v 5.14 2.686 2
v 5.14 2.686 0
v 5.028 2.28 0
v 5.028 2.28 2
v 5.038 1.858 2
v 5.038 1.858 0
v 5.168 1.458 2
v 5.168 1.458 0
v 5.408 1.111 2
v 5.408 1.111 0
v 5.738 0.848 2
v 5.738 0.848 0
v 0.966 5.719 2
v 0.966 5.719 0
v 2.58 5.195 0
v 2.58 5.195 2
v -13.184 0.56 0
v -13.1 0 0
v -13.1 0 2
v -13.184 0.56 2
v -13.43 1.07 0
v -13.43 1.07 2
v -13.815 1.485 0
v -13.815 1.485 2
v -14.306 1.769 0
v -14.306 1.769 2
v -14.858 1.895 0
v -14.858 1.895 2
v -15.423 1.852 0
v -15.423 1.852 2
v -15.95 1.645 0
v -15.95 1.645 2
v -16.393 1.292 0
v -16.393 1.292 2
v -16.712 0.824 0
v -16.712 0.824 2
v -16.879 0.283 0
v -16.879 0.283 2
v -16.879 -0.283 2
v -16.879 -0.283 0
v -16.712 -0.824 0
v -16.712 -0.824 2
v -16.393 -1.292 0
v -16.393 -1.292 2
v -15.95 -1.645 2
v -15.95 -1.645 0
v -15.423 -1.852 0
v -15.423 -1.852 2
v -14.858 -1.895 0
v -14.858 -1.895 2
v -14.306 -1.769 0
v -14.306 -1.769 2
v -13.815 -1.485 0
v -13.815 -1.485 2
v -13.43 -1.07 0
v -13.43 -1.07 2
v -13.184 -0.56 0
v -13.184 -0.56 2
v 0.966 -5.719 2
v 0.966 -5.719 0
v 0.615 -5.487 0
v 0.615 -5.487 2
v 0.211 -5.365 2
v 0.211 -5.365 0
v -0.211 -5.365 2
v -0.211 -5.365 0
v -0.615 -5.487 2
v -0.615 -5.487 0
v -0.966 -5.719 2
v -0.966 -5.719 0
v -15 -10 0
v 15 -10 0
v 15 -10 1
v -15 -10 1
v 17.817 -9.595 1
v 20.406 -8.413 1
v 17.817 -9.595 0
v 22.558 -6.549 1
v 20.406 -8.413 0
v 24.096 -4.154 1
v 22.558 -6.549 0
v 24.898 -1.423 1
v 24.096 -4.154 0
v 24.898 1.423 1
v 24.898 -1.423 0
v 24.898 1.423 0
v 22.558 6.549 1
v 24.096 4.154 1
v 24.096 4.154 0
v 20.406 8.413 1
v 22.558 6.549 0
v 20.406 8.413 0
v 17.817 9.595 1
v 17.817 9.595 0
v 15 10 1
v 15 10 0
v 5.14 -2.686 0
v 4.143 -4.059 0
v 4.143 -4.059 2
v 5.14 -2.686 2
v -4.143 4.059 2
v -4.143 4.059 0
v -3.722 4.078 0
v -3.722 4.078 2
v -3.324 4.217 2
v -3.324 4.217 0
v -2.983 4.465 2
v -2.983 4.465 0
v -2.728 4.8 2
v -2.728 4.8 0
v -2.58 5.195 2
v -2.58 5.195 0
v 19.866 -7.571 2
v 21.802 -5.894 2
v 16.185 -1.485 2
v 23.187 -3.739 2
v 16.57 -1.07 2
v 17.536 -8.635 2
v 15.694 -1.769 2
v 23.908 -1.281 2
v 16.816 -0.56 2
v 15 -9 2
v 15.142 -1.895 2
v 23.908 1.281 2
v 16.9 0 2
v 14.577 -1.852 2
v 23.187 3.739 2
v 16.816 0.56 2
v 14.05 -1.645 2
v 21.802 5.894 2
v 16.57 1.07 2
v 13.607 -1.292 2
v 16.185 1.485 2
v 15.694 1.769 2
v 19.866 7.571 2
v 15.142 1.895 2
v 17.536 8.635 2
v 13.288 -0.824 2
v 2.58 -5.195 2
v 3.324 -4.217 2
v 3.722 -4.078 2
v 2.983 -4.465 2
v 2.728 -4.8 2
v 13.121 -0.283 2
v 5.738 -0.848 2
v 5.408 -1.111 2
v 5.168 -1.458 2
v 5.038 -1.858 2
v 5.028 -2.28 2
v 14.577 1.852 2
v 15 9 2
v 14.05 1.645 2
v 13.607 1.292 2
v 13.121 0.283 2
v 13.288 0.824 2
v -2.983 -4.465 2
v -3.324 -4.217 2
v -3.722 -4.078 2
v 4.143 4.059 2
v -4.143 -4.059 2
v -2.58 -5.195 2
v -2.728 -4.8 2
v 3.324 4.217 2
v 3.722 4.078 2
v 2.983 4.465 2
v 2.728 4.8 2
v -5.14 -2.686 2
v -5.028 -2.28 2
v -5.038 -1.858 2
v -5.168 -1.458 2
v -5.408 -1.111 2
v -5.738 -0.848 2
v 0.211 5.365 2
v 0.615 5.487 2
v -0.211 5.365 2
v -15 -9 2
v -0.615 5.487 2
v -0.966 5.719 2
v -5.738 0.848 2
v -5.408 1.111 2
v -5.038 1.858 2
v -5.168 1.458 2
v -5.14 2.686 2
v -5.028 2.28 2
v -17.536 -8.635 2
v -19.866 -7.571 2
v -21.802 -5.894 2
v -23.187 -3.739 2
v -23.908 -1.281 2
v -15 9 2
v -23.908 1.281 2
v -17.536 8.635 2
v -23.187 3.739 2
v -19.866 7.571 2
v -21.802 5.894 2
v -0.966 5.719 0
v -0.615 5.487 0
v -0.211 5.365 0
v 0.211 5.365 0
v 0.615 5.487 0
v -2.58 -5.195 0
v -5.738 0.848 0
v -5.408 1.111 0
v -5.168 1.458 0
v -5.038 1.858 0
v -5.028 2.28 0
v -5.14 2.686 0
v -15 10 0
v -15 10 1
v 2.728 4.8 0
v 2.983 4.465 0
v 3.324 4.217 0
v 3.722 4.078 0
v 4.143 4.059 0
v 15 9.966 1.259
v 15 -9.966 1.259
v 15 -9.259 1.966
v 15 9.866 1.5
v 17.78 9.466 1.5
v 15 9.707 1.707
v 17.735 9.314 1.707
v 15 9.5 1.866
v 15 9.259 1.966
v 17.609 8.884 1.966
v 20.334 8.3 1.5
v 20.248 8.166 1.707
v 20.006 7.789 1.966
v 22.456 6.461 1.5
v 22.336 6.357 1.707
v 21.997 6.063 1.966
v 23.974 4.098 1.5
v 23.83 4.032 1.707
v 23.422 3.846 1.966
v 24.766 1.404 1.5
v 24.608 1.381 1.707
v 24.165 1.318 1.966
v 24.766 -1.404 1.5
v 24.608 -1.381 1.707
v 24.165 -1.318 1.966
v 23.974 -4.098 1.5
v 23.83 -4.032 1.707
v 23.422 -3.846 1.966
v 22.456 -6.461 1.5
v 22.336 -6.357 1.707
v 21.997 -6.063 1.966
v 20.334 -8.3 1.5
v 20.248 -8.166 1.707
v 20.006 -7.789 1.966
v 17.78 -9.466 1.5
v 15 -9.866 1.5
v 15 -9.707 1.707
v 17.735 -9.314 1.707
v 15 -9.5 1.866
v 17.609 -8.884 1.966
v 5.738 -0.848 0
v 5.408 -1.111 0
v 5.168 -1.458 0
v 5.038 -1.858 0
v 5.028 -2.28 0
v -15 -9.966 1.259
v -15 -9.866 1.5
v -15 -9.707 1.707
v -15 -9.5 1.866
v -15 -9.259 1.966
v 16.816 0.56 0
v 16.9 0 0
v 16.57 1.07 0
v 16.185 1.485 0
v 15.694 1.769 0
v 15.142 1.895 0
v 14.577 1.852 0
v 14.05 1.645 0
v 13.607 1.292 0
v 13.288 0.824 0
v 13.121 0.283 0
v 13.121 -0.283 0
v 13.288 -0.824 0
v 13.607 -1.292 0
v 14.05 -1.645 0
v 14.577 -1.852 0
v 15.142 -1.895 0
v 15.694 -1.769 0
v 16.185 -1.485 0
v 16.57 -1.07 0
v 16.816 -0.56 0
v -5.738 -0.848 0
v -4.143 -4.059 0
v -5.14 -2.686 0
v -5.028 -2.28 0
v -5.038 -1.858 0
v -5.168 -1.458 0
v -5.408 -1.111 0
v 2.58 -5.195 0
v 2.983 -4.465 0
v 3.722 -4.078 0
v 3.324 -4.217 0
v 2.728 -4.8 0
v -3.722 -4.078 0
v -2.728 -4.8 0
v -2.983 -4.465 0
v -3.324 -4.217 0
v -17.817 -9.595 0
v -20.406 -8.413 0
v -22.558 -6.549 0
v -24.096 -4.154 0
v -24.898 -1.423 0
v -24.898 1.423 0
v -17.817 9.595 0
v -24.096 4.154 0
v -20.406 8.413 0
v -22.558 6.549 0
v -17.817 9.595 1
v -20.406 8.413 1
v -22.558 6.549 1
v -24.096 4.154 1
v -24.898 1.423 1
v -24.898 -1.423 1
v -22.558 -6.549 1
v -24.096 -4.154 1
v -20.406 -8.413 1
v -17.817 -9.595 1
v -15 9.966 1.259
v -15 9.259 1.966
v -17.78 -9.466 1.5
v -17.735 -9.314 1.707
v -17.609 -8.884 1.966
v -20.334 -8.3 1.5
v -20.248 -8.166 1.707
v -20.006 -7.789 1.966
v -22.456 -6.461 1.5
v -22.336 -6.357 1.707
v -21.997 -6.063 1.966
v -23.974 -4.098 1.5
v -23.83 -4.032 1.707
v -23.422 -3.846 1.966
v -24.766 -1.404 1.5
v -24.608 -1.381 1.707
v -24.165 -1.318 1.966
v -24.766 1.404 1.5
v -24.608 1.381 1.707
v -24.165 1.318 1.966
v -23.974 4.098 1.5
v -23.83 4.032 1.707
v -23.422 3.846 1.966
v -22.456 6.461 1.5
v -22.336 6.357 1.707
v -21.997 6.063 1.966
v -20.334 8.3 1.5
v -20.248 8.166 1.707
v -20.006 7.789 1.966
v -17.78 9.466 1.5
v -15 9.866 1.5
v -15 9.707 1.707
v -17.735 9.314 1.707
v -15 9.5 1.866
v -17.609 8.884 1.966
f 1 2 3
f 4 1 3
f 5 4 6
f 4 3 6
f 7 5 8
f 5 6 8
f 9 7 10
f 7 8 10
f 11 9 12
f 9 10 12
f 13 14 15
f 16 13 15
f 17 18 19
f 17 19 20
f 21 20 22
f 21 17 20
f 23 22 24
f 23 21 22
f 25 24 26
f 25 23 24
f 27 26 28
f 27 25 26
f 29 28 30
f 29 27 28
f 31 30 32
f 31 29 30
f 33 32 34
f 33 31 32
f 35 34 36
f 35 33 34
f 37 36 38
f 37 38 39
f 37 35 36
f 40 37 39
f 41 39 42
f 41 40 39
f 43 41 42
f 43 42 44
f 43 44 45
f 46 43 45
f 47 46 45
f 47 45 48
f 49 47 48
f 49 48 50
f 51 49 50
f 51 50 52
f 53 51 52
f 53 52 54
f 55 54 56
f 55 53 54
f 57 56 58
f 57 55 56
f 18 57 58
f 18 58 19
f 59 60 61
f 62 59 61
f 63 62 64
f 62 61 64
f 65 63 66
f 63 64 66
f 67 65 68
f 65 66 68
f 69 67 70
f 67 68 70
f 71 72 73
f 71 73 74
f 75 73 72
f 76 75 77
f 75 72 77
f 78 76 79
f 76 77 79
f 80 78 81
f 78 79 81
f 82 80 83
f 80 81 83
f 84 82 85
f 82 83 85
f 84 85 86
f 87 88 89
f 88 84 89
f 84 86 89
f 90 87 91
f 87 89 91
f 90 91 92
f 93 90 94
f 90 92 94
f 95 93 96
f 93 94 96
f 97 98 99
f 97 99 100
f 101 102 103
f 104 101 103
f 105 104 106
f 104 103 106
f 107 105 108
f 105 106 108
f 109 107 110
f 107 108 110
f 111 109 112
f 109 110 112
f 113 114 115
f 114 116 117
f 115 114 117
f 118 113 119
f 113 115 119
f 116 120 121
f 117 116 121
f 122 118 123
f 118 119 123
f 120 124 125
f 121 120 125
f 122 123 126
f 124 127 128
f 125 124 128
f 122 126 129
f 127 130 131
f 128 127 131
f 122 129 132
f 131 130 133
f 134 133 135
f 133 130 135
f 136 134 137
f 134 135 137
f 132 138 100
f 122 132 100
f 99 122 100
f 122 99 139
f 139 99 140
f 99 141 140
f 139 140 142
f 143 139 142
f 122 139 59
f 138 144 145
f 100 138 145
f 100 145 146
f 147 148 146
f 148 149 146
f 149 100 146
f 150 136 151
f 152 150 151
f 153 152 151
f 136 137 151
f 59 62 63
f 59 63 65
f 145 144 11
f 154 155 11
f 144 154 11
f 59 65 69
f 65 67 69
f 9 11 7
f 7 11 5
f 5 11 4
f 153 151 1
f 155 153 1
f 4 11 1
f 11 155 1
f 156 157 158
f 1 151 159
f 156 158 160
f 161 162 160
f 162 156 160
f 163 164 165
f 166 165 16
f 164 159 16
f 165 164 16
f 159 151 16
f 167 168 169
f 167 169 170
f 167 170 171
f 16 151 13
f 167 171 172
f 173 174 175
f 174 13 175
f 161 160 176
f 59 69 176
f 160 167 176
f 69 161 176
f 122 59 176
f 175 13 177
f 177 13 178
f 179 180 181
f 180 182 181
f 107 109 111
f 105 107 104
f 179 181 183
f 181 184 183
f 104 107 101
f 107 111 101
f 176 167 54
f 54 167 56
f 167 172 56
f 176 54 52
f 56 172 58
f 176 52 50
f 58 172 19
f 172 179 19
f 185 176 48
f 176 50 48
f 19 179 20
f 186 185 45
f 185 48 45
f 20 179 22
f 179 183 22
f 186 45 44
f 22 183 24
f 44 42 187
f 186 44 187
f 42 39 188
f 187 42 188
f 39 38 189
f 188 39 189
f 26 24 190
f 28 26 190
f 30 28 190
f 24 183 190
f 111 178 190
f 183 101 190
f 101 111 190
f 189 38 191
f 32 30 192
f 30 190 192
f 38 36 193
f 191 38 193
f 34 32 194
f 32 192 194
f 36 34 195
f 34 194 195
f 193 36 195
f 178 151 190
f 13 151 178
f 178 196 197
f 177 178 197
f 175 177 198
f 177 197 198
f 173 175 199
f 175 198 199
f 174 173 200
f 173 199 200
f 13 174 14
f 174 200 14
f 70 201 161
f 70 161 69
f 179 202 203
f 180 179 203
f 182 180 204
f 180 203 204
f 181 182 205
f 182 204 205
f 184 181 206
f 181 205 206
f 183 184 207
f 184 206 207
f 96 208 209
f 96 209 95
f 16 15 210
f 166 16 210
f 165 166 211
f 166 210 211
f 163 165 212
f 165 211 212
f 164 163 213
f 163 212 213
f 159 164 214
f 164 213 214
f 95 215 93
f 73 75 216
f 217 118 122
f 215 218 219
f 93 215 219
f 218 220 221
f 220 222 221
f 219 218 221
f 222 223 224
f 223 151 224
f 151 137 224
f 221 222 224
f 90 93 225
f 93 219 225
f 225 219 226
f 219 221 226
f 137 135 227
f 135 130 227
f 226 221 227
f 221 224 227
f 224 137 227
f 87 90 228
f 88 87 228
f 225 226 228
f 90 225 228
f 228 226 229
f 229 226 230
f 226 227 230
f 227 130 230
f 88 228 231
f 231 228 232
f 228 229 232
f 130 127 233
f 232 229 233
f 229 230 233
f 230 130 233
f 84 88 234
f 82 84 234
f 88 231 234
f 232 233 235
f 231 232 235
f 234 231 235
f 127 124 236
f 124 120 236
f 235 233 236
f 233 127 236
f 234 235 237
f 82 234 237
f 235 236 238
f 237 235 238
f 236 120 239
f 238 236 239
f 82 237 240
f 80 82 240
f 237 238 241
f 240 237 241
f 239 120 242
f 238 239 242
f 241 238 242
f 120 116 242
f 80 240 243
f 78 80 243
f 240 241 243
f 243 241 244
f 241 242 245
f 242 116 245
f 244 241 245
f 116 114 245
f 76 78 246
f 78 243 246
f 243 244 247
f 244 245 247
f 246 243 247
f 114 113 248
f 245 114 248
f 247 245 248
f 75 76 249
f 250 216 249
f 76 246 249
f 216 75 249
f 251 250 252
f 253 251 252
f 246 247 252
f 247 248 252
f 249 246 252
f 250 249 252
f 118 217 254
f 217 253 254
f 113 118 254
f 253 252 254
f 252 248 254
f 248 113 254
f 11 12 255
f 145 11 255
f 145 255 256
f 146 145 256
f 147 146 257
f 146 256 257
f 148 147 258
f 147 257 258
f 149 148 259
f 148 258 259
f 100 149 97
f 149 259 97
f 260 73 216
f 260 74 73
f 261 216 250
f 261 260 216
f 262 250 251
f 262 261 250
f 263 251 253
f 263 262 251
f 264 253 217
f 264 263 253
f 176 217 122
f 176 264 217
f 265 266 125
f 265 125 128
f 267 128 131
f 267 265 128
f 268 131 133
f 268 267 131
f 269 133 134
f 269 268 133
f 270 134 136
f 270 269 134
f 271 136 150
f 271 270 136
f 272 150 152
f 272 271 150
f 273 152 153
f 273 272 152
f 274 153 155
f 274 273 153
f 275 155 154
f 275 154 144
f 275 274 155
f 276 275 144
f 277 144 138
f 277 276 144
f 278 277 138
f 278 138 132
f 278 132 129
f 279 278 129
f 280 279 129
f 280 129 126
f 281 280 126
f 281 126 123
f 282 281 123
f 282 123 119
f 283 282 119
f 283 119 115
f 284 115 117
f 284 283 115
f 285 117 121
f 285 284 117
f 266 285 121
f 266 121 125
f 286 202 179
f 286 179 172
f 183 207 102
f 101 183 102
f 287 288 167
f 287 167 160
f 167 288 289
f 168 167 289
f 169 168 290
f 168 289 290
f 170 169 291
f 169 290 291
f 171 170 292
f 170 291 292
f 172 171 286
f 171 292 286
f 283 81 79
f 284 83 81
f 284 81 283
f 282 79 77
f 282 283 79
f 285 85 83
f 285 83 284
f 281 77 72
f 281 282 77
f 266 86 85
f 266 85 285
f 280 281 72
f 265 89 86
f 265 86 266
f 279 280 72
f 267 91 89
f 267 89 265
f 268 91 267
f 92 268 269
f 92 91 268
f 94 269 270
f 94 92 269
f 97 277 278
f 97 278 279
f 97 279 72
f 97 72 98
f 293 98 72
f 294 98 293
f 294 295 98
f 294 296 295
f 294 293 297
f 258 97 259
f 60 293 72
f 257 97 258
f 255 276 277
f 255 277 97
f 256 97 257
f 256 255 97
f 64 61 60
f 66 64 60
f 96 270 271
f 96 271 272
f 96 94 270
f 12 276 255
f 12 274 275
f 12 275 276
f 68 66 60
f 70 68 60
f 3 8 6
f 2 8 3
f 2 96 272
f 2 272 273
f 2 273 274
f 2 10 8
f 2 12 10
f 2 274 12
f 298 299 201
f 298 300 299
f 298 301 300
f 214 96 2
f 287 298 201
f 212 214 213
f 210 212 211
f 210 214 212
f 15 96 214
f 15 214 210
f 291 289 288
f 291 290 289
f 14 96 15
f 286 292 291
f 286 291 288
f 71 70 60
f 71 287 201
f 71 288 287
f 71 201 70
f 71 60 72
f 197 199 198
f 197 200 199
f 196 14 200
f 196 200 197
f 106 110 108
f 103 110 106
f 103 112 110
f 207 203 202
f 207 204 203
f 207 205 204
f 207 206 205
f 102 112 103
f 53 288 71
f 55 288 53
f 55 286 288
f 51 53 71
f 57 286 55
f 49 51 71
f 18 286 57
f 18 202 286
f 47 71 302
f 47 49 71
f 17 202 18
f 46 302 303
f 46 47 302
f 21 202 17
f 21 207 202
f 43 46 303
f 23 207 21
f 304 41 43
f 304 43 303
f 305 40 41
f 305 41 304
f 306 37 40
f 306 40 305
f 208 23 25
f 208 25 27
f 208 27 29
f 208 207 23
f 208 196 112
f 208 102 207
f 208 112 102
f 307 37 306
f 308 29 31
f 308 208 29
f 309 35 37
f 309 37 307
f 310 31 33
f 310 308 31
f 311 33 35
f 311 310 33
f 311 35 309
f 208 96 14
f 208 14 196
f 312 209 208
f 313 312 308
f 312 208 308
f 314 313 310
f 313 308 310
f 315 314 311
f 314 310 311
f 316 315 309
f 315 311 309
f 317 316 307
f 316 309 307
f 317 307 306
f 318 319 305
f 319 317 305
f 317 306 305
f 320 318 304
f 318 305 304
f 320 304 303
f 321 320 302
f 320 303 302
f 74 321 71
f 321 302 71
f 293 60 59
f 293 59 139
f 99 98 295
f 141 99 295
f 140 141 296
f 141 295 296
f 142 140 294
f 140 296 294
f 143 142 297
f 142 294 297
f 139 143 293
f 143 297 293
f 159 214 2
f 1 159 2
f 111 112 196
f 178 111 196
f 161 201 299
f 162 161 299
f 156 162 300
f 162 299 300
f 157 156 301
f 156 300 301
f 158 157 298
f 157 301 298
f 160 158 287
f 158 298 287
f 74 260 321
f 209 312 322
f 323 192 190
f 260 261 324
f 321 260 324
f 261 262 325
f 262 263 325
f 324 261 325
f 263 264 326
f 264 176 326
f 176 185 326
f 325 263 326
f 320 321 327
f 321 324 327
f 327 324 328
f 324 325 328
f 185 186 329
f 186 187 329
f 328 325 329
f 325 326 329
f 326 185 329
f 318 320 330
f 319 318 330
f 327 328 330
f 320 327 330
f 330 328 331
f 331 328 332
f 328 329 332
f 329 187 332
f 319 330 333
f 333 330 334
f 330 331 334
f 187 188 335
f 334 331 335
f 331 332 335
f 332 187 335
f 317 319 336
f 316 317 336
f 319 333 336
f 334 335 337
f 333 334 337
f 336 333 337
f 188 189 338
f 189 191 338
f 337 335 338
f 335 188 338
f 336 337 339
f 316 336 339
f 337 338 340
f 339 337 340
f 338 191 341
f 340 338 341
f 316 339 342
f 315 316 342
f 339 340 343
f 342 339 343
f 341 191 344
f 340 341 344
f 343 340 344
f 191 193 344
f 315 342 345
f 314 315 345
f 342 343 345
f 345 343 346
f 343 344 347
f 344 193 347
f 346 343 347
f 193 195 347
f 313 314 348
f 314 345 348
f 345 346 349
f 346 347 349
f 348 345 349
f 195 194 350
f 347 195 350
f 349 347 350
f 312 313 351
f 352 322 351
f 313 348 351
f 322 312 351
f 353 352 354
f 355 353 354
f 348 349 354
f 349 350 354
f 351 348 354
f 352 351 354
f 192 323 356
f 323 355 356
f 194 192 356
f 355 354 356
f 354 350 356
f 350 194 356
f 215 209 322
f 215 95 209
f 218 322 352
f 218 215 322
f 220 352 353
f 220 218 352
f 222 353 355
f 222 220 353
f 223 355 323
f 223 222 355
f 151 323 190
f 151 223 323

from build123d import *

# Parameters (mm, degrees)
SKETCH_R  = 1.9
PAD_DEPTH = 2
FILLET_R  = 1


with BuildPart() as part:
    # Sketch → Pad (new body)
    with BuildSketch(Plane.XY):
        with BuildLine():
            Line((-15.000027, 10), (15.000027, 10))
            ThreePointArc((15.000027, -10), (25, 0), (15.000027, 10))
            Line((15.000027, -10), (-15.000027, -10))
            ThreePointArc((-15.000027, 10), (-25, 0), (-15.000027, -10))
        make_face()
        with Locations((-15, 0)):
            Circle(SKETCH_R, mode=Mode.SUBTRACT)
        with Locations((15, 0)):
            Circle(SKETCH_R, mode=Mode.SUBTRACT)
        with BuildLine():
            ThreePointArc((-0.966331, 5.718934), (0, 5.35), (0.966331, 5.718934))
            Line((0.966331, 5.718934), (2.579727, 5.19471))
            ThreePointArc((2.579727, 5.19471), (3.144651, 4.328241), (4.143283, 4.058719))
            Line((4.143283, 4.058719), (5.140417, 2.686283))
            ThreePointArc((5.140417, 2.686283), (5.088152, 1.653241), (5.737642, 0.848212))
            Line((5.737642, 0.848212), (5.737642, -0.848212))
            ThreePointArc((5.737642, -0.848212), (5.088152, -1.653241), (5.140417, -2.686283))
            Line((4.143283, -4.058719), (5.140417, -2.686283))
            ThreePointArc((4.143283, -4.058719), (3.144651, -4.328241), (2.579727, -5.19471))
            Line((0.966331, -5.718934), (2.579727, -5.19471))
            ThreePointArc((0.966331, -5.718934), (0, -5.35), (-0.966331, -5.718934))
            Line((-2.579727, -5.19471), (-0.966331, -5.718934))
            ThreePointArc((-2.579727, -5.19471), (-3.144651, -4.328241), (-4.143283, -4.058719))
            Line((-5.140417, -2.686283), (-4.143283, -4.058719))
            ThreePointArc((-5.140417, -2.686283), (-5.088152, -1.653241), (-5.737642, -0.848212))
            Line((-5.737642, 0.848212), (-5.737642, -0.848212))
            ThreePointArc((-5.737642, 0.848212), (-5.088152, 1.653241), (-5.140417, 2.686283))
            Line((-5.140417, 2.686283), (-4.143283, 4.058719))
            ThreePointArc((-4.143283, 4.058719), (-3.144651, 4.328241), (-2.579727, 5.19471))
            Line((-2.579727, 5.19471), (-0.966331, 5.718934))
        make_face(mode=Mode.SUBTRACT)
    extrude(amount=PAD_DEPTH)

    # Fillet
    fillet_edges = [part.edges().sort_by_distance(p)[0] for p in [
        (0, -10, 2),
        (-25, 0, 2),
        (0, 10, 2),
        (25, 0, 2),
    ]]
    fillet(fillet_edges, radius=FILLET_R)


solid = part.part
